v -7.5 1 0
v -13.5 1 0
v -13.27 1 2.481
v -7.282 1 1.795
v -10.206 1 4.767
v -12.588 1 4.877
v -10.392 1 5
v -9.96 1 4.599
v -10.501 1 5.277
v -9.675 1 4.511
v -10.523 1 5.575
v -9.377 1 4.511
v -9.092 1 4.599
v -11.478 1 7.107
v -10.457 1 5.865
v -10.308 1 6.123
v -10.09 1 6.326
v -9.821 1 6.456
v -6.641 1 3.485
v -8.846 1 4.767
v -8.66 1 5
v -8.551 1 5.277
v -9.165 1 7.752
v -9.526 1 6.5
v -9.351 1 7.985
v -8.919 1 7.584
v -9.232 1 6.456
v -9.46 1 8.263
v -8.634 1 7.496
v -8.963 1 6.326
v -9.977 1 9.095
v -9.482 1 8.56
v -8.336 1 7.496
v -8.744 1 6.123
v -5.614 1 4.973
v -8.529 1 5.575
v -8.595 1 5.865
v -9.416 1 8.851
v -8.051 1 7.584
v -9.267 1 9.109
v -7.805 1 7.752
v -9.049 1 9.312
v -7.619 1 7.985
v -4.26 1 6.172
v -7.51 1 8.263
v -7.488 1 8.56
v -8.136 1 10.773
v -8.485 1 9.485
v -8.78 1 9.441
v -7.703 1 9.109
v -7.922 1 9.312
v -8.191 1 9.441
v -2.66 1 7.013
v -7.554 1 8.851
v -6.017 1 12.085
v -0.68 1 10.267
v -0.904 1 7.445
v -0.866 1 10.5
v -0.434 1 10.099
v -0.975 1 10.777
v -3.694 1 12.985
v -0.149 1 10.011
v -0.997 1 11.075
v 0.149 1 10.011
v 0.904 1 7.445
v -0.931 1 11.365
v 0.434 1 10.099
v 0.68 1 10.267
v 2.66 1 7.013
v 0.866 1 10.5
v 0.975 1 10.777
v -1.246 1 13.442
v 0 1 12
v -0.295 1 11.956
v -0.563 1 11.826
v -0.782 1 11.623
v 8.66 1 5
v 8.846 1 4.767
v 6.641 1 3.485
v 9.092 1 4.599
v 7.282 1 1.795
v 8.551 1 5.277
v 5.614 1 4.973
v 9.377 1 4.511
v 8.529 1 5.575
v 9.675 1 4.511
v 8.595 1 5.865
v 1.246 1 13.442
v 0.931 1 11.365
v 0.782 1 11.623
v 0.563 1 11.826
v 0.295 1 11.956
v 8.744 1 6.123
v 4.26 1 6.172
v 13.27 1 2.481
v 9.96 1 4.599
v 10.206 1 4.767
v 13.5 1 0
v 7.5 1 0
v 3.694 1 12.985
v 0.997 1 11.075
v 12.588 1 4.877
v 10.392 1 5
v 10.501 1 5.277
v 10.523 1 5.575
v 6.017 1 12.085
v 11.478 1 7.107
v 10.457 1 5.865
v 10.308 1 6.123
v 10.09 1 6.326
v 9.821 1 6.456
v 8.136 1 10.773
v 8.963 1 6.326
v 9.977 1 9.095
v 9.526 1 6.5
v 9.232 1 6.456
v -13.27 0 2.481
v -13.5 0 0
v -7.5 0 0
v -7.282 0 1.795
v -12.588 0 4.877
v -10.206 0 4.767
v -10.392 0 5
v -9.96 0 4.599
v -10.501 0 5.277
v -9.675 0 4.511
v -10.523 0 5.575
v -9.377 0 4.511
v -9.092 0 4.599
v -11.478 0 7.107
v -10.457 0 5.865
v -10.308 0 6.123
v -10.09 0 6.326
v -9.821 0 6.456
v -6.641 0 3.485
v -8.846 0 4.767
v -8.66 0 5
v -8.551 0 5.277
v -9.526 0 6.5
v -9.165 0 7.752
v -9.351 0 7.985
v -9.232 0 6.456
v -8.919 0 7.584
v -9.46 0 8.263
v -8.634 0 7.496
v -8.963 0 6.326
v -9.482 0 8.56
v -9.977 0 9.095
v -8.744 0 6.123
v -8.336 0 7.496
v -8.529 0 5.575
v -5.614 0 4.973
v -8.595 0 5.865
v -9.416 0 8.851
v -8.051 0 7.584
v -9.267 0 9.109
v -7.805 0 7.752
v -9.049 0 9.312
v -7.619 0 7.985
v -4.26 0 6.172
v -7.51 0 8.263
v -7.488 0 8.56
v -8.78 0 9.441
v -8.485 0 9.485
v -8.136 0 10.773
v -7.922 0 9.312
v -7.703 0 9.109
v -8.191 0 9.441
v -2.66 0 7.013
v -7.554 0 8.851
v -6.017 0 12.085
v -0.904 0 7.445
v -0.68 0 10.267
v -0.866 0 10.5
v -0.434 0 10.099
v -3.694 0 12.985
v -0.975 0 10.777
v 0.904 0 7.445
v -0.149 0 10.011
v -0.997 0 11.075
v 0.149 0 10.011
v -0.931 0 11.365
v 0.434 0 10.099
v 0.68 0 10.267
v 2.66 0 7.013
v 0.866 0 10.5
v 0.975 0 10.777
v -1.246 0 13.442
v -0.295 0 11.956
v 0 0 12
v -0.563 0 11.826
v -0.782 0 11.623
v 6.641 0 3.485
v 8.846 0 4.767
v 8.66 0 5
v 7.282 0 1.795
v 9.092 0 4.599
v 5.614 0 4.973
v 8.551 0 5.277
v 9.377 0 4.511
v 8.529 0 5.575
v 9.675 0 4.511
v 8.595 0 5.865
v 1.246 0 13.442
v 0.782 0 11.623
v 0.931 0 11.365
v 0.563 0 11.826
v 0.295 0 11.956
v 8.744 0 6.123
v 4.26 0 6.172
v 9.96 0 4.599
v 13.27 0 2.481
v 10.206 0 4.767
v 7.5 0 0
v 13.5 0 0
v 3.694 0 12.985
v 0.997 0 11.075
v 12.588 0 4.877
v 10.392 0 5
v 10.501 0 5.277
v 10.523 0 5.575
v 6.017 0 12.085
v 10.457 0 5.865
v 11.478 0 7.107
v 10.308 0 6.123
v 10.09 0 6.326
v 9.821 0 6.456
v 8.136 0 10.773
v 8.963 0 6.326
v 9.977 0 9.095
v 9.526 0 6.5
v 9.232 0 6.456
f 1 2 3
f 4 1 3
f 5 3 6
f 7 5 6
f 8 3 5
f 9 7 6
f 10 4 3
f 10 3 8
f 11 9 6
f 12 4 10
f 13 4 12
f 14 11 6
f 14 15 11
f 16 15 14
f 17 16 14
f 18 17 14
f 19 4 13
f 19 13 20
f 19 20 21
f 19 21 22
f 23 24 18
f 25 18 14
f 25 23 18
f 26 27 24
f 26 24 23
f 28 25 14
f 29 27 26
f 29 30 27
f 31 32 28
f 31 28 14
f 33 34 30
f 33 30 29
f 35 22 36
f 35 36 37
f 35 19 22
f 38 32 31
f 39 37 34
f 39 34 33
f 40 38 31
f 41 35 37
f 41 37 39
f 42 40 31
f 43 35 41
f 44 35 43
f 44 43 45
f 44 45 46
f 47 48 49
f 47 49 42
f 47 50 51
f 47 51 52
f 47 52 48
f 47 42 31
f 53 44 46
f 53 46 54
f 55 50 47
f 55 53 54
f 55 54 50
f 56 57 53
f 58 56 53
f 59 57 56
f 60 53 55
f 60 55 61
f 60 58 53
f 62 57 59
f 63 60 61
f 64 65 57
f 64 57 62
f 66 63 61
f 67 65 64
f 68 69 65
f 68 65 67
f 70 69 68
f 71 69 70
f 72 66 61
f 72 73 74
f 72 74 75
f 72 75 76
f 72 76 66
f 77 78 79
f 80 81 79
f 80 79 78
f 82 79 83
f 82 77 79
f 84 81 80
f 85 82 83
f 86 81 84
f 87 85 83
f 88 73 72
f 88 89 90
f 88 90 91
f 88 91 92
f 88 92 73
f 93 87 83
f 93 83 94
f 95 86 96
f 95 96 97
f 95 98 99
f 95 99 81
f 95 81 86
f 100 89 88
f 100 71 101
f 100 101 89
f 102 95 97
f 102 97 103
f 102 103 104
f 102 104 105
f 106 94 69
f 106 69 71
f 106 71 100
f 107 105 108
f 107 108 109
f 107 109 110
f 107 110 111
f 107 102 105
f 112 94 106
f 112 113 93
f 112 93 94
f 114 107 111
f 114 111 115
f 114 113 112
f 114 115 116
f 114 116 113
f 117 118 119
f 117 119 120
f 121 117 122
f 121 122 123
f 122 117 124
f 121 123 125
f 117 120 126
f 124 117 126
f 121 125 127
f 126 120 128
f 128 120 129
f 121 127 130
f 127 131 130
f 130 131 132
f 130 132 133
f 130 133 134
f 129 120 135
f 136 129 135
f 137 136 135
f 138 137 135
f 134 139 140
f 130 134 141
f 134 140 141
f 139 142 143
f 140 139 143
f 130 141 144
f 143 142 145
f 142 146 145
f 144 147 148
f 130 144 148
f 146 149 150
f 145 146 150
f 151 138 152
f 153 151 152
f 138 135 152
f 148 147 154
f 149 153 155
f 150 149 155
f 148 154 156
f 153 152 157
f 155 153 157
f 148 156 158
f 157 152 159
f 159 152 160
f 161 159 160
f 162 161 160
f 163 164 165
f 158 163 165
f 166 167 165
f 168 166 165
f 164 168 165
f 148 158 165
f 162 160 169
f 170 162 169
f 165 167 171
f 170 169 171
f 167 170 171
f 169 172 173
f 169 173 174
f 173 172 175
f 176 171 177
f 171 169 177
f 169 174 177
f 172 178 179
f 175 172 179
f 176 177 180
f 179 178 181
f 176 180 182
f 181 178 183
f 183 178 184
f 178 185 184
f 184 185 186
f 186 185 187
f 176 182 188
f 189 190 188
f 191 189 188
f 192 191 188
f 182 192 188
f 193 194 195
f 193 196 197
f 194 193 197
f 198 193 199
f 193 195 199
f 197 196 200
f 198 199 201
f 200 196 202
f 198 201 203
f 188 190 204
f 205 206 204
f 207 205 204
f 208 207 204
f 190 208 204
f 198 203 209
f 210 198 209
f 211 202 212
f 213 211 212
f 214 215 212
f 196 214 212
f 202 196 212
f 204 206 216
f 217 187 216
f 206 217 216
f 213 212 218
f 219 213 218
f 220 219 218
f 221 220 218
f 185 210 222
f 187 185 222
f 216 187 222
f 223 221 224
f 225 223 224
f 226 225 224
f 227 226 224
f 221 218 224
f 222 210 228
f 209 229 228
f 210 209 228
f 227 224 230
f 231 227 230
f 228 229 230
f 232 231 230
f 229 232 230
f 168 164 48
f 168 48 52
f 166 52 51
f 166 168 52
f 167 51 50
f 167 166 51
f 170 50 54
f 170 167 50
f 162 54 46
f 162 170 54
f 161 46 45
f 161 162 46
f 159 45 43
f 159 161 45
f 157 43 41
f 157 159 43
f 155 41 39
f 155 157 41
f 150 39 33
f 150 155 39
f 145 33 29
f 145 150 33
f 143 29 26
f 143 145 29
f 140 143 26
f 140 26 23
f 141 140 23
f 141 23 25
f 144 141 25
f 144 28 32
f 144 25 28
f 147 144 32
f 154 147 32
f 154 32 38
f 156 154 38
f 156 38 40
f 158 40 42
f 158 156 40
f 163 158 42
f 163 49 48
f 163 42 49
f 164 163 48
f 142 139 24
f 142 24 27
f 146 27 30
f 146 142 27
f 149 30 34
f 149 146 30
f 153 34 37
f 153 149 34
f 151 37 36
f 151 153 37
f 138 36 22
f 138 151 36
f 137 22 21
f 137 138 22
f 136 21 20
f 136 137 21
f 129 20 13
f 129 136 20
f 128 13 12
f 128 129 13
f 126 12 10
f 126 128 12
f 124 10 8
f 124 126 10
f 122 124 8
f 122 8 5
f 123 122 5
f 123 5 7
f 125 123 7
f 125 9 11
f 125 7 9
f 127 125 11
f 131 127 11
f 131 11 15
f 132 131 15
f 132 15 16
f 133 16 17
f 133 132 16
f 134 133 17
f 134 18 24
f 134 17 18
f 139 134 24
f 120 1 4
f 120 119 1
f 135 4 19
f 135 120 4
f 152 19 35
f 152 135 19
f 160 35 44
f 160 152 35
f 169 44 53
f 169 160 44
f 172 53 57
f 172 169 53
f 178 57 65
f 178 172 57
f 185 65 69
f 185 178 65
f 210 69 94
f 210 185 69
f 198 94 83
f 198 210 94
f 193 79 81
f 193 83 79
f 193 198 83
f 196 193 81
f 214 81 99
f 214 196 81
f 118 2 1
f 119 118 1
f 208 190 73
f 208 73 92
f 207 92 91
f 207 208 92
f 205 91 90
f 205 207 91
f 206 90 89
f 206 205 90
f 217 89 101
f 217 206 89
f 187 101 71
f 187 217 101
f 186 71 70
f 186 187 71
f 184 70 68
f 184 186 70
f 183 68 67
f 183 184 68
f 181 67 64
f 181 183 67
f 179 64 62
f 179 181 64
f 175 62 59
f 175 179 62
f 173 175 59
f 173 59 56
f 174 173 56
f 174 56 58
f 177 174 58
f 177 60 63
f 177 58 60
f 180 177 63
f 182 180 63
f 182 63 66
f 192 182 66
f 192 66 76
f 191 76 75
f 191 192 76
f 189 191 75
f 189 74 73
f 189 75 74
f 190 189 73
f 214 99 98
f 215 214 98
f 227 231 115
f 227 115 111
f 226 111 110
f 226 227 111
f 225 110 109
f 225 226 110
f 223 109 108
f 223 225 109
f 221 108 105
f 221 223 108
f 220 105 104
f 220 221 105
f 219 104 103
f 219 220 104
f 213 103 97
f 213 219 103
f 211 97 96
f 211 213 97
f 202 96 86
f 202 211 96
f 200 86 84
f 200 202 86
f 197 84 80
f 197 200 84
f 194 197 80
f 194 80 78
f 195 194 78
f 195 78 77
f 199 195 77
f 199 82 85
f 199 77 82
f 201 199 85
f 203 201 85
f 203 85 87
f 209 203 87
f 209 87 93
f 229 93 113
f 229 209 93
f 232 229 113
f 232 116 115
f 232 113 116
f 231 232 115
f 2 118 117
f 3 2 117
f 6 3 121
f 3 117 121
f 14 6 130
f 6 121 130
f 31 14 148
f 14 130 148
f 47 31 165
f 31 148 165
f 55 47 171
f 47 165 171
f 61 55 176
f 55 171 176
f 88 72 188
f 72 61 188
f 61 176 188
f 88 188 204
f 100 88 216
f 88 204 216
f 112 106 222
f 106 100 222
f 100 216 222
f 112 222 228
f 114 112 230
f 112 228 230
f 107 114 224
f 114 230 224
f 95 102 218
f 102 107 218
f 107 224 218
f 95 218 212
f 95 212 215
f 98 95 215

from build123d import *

# Parameters (mm, degrees)
SKETCH1_R               = 13.5
BOSS_EXTRUDE1_DEPTH     = 1
CUT_EXTRUDE1_DEPTH      = 20.118054294
CUT_EXTRUDE1_DEPTH_BACK = 20.118054294
SKETCH19_R              = 1
CUT_EXTRUDE2_DEPTH      = 20.118054294
CUT_EXTRUDE2_DEPTH_BACK = 20.118054294
SKETCH20_R              = 7.5
SKETCH21_W              = 65.874202484
SKETCH21_H              = 51.979273979
CUT_EXTRUDE3_DEPTH      = 20.118054294


with BuildPart() as part:
    # Sketch1 → Boss-Extrude1 (new body)
    with BuildSketch(Plane(origin=(0, 0, 0), x_dir=(1, 0, 0), z_dir=(0, 1, 0))):
        with Locations(Location((0, 0, 0), (0, 0, 270))):
            Circle(SKETCH1_R)
    extrude(amount=BOSS_EXTRUDE1_DEPTH)

    # Sketch19 → Cut-Extrude1 (cut, two sides: drawn at the far end of the back side and taken through both)
    with BuildSketch(Plane(origin=(0, 1, 0), x_dir=(1, 0, 0), z_dir=(0, 1, 0)).offset(-CUT_EXTRUDE1_DEPTH_BACK)):
        with Locations(Location((0, 11, 0), (0, 0, 270))):
            Circle(SKETCH19_R)
        with Locations(Location((9.526279442, 5.5, 0), (0, 0, 270))):
            Circle(SKETCH19_R)
        with Locations(Location((9.526279442, -5.5, 0), (0, 0, 270))):
            Circle(SKETCH19_R)
        with Locations(Location((0, -11, 0), (0, 0, 270))):
            Circle(SKETCH19_R)
        with Locations(Location((-9.526279442, -5.5, 0), (0, 0, 270))):
            Circle(SKETCH19_R)
        with Locations(Location((-9.526279442, 5.5, 0), (0, 0, 270))):
            Circle(SKETCH19_R)
        with Locations(Location((-8.485281374, -8.485281374, 0), (0, 0, 270))):
            Circle(SKETCH19_R)
    extrude(amount=CUT_EXTRUDE1_DEPTH + CUT_EXTRUDE1_DEPTH_BACK, mode=Mode.SUBTRACT)

    # Sketch20 → Cut-Extrude2 (cut, two sides: drawn at the far end of the back side and taken through both)
    with BuildSketch(Plane(origin=(0, 1, 0), x_dir=(1, 0, 0), z_dir=(0, 1, 0)).offset(-CUT_EXTRUDE2_DEPTH_BACK)):
        with Locations(Location((0, 0, 0), (0, 0, 270))):
            Circle(SKETCH20_R)
    extrude(amount=CUT_EXTRUDE2_DEPTH + CUT_EXTRUDE2_DEPTH_BACK, mode=Mode.SUBTRACT)

    # Sketch21 → Cut-Extrude3 (cut, through all)
    with BuildSketch(Plane.XY):
        with Locations((-3.816154381, 6.321647006)):
            Rectangle(SKETCH21_W, SKETCH21_H)
    extrude(amount=-CUT_EXTRUDE3_DEPTH, mode=Mode.SUBTRACT)


solid = part.part
